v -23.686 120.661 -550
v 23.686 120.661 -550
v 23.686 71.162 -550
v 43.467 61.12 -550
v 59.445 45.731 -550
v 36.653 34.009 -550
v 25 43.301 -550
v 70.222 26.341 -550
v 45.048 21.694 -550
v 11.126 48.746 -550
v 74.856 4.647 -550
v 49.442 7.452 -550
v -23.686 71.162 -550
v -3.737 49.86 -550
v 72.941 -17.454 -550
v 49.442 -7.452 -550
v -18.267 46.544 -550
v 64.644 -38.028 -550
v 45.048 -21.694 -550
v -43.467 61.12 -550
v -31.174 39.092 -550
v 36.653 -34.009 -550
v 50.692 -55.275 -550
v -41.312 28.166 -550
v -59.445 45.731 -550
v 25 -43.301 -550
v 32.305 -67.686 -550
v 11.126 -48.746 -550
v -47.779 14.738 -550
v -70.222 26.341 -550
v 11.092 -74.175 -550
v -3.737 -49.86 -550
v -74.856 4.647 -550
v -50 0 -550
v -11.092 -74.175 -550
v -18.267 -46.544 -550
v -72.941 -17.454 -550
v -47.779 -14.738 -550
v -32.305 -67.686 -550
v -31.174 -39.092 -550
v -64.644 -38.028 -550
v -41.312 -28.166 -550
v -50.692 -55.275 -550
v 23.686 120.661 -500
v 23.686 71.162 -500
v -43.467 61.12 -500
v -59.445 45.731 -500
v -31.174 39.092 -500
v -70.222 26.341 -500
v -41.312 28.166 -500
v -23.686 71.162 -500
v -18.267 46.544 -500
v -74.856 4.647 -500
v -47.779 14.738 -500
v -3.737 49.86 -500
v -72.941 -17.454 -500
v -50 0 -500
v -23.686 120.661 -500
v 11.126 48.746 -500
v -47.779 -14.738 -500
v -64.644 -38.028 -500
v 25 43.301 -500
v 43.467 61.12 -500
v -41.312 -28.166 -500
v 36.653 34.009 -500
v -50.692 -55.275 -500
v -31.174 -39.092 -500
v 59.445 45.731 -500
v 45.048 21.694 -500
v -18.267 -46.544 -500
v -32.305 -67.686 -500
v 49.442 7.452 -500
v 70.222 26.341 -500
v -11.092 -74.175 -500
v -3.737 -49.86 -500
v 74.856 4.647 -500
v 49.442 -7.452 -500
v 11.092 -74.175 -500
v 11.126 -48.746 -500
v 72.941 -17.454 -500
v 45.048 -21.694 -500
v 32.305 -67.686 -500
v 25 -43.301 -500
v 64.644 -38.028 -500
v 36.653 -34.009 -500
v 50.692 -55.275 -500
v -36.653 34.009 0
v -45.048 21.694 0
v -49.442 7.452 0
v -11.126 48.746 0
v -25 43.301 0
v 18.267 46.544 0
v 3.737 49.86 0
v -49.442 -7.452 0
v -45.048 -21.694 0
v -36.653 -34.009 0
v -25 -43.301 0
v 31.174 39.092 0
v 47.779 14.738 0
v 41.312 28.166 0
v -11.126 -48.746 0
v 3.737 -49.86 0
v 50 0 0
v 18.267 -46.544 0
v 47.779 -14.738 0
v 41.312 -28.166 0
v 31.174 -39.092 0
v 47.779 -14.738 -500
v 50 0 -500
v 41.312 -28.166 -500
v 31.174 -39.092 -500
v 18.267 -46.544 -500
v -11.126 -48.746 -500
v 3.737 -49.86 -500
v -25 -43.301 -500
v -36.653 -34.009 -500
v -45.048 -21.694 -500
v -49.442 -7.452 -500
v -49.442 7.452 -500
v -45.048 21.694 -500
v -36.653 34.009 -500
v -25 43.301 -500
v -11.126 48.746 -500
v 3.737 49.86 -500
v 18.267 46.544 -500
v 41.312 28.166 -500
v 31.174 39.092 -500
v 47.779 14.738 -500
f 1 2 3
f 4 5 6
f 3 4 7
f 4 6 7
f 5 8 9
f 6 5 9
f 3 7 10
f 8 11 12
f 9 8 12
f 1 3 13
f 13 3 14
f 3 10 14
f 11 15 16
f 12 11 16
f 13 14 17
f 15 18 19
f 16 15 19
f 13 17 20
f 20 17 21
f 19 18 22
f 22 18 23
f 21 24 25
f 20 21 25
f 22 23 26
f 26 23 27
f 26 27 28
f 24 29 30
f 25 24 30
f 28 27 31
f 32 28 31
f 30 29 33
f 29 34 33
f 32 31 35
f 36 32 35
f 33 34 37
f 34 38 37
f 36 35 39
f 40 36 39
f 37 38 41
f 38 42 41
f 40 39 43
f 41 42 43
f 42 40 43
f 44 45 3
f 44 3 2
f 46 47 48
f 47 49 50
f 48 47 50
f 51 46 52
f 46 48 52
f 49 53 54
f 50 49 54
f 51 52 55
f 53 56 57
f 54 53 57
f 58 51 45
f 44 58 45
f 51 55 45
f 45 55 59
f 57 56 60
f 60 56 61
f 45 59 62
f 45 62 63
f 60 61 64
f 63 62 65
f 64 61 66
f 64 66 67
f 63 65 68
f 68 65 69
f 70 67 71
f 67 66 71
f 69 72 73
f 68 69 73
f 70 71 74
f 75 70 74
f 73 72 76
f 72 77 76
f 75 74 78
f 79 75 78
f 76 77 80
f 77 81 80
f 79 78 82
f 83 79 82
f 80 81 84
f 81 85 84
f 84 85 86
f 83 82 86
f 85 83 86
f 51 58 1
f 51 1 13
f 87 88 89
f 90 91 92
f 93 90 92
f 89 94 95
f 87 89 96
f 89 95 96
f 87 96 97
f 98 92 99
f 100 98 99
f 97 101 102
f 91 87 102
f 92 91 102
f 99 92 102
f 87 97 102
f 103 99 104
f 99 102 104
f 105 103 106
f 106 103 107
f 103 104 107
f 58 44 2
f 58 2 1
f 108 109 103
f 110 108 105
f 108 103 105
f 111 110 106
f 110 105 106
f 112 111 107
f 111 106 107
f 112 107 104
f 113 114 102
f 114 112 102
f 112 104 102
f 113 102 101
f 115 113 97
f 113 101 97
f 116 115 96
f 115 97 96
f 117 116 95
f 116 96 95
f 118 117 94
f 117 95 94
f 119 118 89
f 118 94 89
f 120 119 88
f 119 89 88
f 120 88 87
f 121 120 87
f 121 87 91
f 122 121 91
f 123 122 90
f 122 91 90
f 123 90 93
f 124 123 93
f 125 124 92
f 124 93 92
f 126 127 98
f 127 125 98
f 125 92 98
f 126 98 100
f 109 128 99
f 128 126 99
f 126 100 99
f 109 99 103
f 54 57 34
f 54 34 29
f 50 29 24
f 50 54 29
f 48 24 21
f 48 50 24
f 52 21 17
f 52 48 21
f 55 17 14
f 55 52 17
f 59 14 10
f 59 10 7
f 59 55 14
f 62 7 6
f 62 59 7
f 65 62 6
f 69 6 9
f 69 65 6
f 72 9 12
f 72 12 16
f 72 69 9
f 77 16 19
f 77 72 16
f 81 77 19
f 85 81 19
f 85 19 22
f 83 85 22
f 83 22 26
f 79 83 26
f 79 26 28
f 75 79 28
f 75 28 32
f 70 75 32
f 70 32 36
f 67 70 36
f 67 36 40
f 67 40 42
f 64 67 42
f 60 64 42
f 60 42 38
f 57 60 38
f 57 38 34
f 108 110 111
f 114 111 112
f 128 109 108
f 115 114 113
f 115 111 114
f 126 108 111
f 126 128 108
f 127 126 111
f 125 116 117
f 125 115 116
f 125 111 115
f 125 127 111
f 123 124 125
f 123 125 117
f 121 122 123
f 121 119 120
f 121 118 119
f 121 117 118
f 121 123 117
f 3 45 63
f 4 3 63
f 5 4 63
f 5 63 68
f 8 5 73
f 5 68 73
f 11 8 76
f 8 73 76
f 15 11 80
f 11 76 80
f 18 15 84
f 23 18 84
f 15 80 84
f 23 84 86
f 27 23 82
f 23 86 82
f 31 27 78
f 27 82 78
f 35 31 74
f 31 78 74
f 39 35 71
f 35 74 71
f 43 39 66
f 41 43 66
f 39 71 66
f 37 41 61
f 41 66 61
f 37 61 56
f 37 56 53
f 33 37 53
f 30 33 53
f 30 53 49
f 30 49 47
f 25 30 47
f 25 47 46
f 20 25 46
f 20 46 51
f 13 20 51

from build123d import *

# Parameters (mm, degrees)
CUT_EXTRUDE2_START  = -50
SKETCH4_R           = 50
CUT_EXTRUDE2_DEPTH  = 50
BOSS_EXTRUDE2_DEPTH = 50


with BuildPart() as part:
    # Sketch2 → Revolve1 (revolve)
    with BuildSketch(Plane(origin=(0, 0, 0), x_dir=(0, 0, -1), z_dir=(1, 0, 0)), mode=Mode.PRIVATE) as revolve1_sk:
        Polygon((0, 0), (550, 0), (550, -75), (500, -75), (500, -50), (0, -50), align=None)
    revolve(revolve1_sk.sketch.rotate(Axis((0, 0, 0), (0, 0, -1)), 270), axis=Axis((0, 0, 0), (0, 0, -1)))

    # Sketch4 → Cut-Extrude2 (cut)
    with BuildSketch(Plane(origin=(0, 0, -550), x_dir=(-1, 0, 0), z_dir=(0, 0, -1)).offset(CUT_EXTRUDE2_START)):
        Circle(SKETCH4_R)
    extrude(amount=CUT_EXTRUDE2_DEPTH, mode=Mode.SUBTRACT)


with BuildPart() as cut_extrude2_piece_1:
    # of the separate pieces the step leaves, piece 1, a body of its own (cut_extrude2_pieces)
    add(part.part.solids().sort_by_distance((50, 0, 0))[0])


with BuildPart() as cut_extrude2_piece_2:
    # of the separate pieces the step leaves, piece 2, a body of its own (cut_extrude2_pieces)
    add(part.part.solids().sort_by_distance((75, 0, -550))[0])

    # Sketch5 → Boss-Extrude2 (add)
    with BuildSketch(Plane(origin=(0, 0, -550), x_dir=(-1, 0, 0), z_dir=(0, 0, -1))):
        with BuildLine():
            Line((-23.685914499, 120.661191056), (23.685914499, 120.661191056))
            Line((23.685914499, 120.661191056), (23.685914499, 71.161629087))
            ThreePointArc((23.685914499, 71.161629087), (0, 75), (-23.685914499, 71.161629087))
            Line((-23.685914499, 71.161629087), (-23.685914499, 120.661191056))
        make_face()
    extrude(amount=-BOSS_EXTRUDE2_DEPTH)


solid = Compound([cut_extrude2_piece_1.part, cut_extrude2_piece_2.part])
